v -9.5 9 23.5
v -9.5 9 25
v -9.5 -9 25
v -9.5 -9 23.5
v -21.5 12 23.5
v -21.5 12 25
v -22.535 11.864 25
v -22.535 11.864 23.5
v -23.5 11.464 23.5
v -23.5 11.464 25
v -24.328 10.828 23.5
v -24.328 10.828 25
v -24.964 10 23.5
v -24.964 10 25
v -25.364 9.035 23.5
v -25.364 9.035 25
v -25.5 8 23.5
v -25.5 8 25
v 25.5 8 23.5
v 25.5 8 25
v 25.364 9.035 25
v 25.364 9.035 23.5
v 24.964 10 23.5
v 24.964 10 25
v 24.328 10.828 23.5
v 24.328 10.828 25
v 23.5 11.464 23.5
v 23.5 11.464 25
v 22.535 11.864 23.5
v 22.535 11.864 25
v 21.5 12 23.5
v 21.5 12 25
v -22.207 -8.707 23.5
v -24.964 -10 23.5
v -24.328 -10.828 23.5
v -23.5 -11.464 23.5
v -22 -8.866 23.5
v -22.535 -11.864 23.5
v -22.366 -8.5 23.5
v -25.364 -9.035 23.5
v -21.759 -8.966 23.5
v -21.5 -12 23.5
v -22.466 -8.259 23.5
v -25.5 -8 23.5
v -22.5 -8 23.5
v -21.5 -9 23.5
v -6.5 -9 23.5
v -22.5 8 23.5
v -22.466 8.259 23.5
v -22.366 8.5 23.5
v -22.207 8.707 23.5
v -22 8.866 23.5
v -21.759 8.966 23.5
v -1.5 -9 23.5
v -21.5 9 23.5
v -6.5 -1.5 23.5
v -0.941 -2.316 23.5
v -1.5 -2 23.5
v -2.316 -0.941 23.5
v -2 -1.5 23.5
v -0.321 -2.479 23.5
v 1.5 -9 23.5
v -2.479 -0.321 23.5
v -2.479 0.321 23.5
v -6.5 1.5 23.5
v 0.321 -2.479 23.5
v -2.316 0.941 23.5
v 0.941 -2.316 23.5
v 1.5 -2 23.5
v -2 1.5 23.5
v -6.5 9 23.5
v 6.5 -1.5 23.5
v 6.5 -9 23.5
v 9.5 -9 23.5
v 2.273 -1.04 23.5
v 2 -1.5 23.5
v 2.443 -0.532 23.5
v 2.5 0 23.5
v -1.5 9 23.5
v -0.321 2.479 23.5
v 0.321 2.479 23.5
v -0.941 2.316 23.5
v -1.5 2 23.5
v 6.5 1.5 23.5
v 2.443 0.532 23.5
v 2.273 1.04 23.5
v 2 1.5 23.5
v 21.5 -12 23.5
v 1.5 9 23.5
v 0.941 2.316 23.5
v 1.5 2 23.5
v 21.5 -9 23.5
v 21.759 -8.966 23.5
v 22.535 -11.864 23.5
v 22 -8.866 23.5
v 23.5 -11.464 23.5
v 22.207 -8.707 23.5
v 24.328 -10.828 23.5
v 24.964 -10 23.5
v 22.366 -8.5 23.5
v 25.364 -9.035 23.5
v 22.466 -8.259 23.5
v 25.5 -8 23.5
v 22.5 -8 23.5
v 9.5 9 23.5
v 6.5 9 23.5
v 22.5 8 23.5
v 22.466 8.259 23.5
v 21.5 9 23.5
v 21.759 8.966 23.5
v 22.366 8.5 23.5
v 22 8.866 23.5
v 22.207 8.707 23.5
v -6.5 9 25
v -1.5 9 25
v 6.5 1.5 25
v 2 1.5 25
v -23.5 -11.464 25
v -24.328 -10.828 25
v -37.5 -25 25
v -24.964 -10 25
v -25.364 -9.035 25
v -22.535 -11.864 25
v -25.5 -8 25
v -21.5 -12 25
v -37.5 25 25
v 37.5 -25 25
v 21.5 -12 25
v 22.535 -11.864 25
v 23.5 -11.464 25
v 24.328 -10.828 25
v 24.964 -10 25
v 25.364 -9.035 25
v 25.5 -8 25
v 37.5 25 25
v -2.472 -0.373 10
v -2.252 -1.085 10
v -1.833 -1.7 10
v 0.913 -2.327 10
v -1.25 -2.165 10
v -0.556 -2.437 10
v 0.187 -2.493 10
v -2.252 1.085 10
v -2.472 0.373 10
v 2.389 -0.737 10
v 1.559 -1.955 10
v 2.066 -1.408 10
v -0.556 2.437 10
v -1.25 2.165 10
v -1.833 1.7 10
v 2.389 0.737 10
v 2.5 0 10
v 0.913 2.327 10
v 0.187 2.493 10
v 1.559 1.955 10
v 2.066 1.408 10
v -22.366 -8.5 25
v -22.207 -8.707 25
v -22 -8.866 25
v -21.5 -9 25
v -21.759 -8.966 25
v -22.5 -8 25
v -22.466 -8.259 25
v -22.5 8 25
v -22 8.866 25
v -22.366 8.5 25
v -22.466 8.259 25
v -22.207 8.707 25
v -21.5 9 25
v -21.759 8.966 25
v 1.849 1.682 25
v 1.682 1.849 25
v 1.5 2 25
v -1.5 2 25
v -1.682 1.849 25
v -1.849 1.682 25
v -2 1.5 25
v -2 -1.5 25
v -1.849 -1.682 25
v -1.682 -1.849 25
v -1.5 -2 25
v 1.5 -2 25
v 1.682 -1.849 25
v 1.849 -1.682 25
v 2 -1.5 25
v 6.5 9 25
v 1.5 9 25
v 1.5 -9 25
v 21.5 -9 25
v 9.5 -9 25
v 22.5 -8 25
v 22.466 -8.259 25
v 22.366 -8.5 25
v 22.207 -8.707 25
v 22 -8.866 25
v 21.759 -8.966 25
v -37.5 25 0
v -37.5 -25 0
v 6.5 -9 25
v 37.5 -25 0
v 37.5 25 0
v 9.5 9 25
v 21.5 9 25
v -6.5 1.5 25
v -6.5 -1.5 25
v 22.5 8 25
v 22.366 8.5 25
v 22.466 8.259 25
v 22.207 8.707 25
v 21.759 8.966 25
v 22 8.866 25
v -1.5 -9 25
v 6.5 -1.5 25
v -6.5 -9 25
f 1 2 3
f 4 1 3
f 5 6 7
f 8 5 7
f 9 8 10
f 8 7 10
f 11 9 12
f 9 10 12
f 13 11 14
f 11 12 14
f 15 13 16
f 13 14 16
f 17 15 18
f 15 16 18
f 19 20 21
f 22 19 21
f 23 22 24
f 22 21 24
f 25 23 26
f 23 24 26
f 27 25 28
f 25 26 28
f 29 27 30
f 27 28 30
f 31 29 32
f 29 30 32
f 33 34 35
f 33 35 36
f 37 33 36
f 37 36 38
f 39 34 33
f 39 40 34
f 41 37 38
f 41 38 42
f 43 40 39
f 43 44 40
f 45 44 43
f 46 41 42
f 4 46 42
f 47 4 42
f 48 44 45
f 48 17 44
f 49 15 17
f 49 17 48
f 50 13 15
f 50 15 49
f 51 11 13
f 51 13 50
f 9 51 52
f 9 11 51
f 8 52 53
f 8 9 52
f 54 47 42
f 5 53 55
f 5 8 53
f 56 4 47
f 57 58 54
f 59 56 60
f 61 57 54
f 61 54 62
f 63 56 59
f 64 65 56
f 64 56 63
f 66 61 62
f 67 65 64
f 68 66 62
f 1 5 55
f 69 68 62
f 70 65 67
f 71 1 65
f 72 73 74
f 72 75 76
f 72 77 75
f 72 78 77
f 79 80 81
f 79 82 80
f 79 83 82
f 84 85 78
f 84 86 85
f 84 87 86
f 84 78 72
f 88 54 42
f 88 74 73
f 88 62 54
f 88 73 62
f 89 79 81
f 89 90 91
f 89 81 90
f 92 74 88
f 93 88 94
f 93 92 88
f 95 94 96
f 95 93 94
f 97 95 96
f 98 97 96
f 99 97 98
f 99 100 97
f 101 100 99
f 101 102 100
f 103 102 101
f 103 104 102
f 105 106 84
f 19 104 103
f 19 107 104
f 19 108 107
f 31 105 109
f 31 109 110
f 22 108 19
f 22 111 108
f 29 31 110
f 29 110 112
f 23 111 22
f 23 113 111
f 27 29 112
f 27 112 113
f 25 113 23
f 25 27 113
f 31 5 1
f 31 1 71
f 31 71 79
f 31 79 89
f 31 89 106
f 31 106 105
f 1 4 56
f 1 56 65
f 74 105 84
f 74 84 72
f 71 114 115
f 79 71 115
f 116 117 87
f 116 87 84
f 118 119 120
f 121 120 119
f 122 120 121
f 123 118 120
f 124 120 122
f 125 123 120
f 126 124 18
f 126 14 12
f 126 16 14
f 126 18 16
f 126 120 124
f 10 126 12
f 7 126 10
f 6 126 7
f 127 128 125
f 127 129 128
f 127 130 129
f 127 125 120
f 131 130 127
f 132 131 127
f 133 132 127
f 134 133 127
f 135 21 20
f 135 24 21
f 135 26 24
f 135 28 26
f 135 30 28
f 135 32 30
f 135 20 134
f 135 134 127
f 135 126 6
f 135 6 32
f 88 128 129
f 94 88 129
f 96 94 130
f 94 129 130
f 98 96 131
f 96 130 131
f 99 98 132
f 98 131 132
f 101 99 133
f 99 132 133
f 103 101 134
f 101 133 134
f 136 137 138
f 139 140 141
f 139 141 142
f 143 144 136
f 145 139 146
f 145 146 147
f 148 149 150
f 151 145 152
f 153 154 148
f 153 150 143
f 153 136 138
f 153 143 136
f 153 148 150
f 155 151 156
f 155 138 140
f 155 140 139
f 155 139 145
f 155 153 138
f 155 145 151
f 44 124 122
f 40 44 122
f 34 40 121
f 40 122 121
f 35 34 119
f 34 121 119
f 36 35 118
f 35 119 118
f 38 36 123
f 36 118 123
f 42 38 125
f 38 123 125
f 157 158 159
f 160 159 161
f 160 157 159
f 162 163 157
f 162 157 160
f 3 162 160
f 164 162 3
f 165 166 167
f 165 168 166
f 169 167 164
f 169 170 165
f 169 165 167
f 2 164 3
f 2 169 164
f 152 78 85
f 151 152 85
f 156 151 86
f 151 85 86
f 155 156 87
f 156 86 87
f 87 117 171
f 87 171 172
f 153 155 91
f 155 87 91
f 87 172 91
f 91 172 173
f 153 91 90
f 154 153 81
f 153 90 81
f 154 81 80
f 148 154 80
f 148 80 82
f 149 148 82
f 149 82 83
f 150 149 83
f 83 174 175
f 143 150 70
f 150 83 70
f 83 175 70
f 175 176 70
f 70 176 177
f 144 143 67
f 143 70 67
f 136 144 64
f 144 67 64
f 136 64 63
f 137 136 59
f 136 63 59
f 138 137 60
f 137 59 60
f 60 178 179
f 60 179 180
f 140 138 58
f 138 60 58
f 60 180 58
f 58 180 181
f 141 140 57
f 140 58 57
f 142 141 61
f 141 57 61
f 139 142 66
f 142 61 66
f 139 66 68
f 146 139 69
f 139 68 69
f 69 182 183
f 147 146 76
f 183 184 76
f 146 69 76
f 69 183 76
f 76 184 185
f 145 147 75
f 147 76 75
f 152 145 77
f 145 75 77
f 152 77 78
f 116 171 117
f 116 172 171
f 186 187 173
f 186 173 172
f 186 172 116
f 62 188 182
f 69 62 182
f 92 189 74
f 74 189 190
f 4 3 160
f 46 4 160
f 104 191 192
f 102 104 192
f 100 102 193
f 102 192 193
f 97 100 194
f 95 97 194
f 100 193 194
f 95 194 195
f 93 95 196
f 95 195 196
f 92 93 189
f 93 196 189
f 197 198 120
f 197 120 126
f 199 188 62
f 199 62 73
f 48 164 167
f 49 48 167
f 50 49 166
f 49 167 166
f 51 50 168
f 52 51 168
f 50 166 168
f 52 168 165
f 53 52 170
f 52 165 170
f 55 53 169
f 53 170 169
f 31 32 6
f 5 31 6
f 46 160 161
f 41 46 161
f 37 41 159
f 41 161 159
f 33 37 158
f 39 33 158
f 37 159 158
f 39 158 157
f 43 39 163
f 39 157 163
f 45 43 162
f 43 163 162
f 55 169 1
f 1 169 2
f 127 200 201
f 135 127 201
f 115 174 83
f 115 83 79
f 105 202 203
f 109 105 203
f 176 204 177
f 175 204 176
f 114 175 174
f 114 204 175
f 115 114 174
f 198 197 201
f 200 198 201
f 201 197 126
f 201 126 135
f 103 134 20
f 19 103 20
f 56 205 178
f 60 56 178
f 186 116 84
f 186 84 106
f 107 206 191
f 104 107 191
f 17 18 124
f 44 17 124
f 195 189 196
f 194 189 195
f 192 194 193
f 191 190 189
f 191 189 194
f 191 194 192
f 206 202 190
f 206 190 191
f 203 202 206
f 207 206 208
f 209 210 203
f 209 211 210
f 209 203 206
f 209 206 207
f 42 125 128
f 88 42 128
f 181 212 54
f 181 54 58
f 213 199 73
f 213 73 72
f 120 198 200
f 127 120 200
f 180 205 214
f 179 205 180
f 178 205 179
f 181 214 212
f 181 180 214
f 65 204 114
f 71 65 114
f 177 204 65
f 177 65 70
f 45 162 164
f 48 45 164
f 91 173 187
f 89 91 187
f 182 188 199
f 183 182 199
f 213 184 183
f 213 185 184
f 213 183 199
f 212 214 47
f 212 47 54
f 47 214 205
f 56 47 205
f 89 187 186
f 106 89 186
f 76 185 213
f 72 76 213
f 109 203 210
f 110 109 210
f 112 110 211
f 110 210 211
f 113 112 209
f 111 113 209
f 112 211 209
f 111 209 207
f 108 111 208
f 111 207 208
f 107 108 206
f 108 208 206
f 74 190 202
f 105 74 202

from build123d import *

# Parameters (mm, degrees)
F0_W     = 75
F0_H     = 50
F1_DEPTH = 25
F2_W     = 5
F2_H     = 7.5
F3_DEPTH = 1.5
F4_R     = 2.5
F5_DEPTH = 15


with BuildPart() as f1:
    # F0 (on Top) → F1 (new body)
    with BuildSketch(Plane.XY):
        Rectangle(F0_W, F0_H)
    extrude(amount=F1_DEPTH)

    # F2 (on face) → F3 (cut)
    with BuildSketch(Plane.XY.offset(25)):
        with BuildLine():
            Line((-21.5, -12), (21.5, -12))
            ThreePointArc((21.5, -12), (24.328427, -10.828427), (25.5, -8))
            Line((25.5, -8), (25.5, 8))
            ThreePointArc((25.5, 8), (24.328427, 10.828427), (21.5, 12))
            Line((21.5, 12), (-21.5, 12))
            ThreePointArc((-21.5, 12), (-24.328427, 10.828427), (-25.5, 8))
            Line((-25.5, 8), (-25.5, -8))
            ThreePointArc((-25.5, -8), (-24.328427, -10.828427), (-21.5, -12))
        make_face()
        with Locations((-4, -5.25)):
            Rectangle(F2_W, F2_H, mode=Mode.SUBTRACT)
        with Locations((4, -5.25)):
            Rectangle(F2_W, F2_H, mode=Mode.SUBTRACT)
        with BuildLine():
            Line((-9.5, 9), (-9.5, -9))
            Line((-9.5, -9), (-21.5, -9))
            ThreePointArc((-21.5, -9), (-22.207107, -8.707107), (-22.5, -8))
            Line((-22.5, -8), (-22.5, 8))
            ThreePointArc((-22.5, 8), (-22.207107, 8.707107), (-21.5, 9))
            Line((-21.5, 9), (-9.5, 9))
        make_face(mode=Mode.SUBTRACT)
        with Locations((-4, 5.25)):
            Rectangle(F2_W, F2_H, mode=Mode.SUBTRACT)
        with Locations((4, 5.25)):
            Rectangle(F2_W, F2_H, mode=Mode.SUBTRACT)
        with BuildLine():
            ThreePointArc((22.5, -8), (22.207107, -8.707107), (21.5, -9))
            Line((21.5, -9), (9.5, -9))
            Line((9.5, -9), (9.5, 9))
            Line((9.5, 9), (21.5, 9))
            ThreePointArc((21.5, 9), (22.207107, 8.707107), (22.5, 8))
            Line((22.5, 8), (22.5, -8))
        make_face(mode=Mode.SUBTRACT)
    extrude(amount=-F3_DEPTH, mode=Mode.SUBTRACT)

    # F4 (on face) → F5 (cut)
    with BuildSketch(Plane.XY.offset(25)):
        Circle(F4_R)
    extrude(amount=-F5_DEPTH, mode=Mode.SUBTRACT)


solid = f1.part
